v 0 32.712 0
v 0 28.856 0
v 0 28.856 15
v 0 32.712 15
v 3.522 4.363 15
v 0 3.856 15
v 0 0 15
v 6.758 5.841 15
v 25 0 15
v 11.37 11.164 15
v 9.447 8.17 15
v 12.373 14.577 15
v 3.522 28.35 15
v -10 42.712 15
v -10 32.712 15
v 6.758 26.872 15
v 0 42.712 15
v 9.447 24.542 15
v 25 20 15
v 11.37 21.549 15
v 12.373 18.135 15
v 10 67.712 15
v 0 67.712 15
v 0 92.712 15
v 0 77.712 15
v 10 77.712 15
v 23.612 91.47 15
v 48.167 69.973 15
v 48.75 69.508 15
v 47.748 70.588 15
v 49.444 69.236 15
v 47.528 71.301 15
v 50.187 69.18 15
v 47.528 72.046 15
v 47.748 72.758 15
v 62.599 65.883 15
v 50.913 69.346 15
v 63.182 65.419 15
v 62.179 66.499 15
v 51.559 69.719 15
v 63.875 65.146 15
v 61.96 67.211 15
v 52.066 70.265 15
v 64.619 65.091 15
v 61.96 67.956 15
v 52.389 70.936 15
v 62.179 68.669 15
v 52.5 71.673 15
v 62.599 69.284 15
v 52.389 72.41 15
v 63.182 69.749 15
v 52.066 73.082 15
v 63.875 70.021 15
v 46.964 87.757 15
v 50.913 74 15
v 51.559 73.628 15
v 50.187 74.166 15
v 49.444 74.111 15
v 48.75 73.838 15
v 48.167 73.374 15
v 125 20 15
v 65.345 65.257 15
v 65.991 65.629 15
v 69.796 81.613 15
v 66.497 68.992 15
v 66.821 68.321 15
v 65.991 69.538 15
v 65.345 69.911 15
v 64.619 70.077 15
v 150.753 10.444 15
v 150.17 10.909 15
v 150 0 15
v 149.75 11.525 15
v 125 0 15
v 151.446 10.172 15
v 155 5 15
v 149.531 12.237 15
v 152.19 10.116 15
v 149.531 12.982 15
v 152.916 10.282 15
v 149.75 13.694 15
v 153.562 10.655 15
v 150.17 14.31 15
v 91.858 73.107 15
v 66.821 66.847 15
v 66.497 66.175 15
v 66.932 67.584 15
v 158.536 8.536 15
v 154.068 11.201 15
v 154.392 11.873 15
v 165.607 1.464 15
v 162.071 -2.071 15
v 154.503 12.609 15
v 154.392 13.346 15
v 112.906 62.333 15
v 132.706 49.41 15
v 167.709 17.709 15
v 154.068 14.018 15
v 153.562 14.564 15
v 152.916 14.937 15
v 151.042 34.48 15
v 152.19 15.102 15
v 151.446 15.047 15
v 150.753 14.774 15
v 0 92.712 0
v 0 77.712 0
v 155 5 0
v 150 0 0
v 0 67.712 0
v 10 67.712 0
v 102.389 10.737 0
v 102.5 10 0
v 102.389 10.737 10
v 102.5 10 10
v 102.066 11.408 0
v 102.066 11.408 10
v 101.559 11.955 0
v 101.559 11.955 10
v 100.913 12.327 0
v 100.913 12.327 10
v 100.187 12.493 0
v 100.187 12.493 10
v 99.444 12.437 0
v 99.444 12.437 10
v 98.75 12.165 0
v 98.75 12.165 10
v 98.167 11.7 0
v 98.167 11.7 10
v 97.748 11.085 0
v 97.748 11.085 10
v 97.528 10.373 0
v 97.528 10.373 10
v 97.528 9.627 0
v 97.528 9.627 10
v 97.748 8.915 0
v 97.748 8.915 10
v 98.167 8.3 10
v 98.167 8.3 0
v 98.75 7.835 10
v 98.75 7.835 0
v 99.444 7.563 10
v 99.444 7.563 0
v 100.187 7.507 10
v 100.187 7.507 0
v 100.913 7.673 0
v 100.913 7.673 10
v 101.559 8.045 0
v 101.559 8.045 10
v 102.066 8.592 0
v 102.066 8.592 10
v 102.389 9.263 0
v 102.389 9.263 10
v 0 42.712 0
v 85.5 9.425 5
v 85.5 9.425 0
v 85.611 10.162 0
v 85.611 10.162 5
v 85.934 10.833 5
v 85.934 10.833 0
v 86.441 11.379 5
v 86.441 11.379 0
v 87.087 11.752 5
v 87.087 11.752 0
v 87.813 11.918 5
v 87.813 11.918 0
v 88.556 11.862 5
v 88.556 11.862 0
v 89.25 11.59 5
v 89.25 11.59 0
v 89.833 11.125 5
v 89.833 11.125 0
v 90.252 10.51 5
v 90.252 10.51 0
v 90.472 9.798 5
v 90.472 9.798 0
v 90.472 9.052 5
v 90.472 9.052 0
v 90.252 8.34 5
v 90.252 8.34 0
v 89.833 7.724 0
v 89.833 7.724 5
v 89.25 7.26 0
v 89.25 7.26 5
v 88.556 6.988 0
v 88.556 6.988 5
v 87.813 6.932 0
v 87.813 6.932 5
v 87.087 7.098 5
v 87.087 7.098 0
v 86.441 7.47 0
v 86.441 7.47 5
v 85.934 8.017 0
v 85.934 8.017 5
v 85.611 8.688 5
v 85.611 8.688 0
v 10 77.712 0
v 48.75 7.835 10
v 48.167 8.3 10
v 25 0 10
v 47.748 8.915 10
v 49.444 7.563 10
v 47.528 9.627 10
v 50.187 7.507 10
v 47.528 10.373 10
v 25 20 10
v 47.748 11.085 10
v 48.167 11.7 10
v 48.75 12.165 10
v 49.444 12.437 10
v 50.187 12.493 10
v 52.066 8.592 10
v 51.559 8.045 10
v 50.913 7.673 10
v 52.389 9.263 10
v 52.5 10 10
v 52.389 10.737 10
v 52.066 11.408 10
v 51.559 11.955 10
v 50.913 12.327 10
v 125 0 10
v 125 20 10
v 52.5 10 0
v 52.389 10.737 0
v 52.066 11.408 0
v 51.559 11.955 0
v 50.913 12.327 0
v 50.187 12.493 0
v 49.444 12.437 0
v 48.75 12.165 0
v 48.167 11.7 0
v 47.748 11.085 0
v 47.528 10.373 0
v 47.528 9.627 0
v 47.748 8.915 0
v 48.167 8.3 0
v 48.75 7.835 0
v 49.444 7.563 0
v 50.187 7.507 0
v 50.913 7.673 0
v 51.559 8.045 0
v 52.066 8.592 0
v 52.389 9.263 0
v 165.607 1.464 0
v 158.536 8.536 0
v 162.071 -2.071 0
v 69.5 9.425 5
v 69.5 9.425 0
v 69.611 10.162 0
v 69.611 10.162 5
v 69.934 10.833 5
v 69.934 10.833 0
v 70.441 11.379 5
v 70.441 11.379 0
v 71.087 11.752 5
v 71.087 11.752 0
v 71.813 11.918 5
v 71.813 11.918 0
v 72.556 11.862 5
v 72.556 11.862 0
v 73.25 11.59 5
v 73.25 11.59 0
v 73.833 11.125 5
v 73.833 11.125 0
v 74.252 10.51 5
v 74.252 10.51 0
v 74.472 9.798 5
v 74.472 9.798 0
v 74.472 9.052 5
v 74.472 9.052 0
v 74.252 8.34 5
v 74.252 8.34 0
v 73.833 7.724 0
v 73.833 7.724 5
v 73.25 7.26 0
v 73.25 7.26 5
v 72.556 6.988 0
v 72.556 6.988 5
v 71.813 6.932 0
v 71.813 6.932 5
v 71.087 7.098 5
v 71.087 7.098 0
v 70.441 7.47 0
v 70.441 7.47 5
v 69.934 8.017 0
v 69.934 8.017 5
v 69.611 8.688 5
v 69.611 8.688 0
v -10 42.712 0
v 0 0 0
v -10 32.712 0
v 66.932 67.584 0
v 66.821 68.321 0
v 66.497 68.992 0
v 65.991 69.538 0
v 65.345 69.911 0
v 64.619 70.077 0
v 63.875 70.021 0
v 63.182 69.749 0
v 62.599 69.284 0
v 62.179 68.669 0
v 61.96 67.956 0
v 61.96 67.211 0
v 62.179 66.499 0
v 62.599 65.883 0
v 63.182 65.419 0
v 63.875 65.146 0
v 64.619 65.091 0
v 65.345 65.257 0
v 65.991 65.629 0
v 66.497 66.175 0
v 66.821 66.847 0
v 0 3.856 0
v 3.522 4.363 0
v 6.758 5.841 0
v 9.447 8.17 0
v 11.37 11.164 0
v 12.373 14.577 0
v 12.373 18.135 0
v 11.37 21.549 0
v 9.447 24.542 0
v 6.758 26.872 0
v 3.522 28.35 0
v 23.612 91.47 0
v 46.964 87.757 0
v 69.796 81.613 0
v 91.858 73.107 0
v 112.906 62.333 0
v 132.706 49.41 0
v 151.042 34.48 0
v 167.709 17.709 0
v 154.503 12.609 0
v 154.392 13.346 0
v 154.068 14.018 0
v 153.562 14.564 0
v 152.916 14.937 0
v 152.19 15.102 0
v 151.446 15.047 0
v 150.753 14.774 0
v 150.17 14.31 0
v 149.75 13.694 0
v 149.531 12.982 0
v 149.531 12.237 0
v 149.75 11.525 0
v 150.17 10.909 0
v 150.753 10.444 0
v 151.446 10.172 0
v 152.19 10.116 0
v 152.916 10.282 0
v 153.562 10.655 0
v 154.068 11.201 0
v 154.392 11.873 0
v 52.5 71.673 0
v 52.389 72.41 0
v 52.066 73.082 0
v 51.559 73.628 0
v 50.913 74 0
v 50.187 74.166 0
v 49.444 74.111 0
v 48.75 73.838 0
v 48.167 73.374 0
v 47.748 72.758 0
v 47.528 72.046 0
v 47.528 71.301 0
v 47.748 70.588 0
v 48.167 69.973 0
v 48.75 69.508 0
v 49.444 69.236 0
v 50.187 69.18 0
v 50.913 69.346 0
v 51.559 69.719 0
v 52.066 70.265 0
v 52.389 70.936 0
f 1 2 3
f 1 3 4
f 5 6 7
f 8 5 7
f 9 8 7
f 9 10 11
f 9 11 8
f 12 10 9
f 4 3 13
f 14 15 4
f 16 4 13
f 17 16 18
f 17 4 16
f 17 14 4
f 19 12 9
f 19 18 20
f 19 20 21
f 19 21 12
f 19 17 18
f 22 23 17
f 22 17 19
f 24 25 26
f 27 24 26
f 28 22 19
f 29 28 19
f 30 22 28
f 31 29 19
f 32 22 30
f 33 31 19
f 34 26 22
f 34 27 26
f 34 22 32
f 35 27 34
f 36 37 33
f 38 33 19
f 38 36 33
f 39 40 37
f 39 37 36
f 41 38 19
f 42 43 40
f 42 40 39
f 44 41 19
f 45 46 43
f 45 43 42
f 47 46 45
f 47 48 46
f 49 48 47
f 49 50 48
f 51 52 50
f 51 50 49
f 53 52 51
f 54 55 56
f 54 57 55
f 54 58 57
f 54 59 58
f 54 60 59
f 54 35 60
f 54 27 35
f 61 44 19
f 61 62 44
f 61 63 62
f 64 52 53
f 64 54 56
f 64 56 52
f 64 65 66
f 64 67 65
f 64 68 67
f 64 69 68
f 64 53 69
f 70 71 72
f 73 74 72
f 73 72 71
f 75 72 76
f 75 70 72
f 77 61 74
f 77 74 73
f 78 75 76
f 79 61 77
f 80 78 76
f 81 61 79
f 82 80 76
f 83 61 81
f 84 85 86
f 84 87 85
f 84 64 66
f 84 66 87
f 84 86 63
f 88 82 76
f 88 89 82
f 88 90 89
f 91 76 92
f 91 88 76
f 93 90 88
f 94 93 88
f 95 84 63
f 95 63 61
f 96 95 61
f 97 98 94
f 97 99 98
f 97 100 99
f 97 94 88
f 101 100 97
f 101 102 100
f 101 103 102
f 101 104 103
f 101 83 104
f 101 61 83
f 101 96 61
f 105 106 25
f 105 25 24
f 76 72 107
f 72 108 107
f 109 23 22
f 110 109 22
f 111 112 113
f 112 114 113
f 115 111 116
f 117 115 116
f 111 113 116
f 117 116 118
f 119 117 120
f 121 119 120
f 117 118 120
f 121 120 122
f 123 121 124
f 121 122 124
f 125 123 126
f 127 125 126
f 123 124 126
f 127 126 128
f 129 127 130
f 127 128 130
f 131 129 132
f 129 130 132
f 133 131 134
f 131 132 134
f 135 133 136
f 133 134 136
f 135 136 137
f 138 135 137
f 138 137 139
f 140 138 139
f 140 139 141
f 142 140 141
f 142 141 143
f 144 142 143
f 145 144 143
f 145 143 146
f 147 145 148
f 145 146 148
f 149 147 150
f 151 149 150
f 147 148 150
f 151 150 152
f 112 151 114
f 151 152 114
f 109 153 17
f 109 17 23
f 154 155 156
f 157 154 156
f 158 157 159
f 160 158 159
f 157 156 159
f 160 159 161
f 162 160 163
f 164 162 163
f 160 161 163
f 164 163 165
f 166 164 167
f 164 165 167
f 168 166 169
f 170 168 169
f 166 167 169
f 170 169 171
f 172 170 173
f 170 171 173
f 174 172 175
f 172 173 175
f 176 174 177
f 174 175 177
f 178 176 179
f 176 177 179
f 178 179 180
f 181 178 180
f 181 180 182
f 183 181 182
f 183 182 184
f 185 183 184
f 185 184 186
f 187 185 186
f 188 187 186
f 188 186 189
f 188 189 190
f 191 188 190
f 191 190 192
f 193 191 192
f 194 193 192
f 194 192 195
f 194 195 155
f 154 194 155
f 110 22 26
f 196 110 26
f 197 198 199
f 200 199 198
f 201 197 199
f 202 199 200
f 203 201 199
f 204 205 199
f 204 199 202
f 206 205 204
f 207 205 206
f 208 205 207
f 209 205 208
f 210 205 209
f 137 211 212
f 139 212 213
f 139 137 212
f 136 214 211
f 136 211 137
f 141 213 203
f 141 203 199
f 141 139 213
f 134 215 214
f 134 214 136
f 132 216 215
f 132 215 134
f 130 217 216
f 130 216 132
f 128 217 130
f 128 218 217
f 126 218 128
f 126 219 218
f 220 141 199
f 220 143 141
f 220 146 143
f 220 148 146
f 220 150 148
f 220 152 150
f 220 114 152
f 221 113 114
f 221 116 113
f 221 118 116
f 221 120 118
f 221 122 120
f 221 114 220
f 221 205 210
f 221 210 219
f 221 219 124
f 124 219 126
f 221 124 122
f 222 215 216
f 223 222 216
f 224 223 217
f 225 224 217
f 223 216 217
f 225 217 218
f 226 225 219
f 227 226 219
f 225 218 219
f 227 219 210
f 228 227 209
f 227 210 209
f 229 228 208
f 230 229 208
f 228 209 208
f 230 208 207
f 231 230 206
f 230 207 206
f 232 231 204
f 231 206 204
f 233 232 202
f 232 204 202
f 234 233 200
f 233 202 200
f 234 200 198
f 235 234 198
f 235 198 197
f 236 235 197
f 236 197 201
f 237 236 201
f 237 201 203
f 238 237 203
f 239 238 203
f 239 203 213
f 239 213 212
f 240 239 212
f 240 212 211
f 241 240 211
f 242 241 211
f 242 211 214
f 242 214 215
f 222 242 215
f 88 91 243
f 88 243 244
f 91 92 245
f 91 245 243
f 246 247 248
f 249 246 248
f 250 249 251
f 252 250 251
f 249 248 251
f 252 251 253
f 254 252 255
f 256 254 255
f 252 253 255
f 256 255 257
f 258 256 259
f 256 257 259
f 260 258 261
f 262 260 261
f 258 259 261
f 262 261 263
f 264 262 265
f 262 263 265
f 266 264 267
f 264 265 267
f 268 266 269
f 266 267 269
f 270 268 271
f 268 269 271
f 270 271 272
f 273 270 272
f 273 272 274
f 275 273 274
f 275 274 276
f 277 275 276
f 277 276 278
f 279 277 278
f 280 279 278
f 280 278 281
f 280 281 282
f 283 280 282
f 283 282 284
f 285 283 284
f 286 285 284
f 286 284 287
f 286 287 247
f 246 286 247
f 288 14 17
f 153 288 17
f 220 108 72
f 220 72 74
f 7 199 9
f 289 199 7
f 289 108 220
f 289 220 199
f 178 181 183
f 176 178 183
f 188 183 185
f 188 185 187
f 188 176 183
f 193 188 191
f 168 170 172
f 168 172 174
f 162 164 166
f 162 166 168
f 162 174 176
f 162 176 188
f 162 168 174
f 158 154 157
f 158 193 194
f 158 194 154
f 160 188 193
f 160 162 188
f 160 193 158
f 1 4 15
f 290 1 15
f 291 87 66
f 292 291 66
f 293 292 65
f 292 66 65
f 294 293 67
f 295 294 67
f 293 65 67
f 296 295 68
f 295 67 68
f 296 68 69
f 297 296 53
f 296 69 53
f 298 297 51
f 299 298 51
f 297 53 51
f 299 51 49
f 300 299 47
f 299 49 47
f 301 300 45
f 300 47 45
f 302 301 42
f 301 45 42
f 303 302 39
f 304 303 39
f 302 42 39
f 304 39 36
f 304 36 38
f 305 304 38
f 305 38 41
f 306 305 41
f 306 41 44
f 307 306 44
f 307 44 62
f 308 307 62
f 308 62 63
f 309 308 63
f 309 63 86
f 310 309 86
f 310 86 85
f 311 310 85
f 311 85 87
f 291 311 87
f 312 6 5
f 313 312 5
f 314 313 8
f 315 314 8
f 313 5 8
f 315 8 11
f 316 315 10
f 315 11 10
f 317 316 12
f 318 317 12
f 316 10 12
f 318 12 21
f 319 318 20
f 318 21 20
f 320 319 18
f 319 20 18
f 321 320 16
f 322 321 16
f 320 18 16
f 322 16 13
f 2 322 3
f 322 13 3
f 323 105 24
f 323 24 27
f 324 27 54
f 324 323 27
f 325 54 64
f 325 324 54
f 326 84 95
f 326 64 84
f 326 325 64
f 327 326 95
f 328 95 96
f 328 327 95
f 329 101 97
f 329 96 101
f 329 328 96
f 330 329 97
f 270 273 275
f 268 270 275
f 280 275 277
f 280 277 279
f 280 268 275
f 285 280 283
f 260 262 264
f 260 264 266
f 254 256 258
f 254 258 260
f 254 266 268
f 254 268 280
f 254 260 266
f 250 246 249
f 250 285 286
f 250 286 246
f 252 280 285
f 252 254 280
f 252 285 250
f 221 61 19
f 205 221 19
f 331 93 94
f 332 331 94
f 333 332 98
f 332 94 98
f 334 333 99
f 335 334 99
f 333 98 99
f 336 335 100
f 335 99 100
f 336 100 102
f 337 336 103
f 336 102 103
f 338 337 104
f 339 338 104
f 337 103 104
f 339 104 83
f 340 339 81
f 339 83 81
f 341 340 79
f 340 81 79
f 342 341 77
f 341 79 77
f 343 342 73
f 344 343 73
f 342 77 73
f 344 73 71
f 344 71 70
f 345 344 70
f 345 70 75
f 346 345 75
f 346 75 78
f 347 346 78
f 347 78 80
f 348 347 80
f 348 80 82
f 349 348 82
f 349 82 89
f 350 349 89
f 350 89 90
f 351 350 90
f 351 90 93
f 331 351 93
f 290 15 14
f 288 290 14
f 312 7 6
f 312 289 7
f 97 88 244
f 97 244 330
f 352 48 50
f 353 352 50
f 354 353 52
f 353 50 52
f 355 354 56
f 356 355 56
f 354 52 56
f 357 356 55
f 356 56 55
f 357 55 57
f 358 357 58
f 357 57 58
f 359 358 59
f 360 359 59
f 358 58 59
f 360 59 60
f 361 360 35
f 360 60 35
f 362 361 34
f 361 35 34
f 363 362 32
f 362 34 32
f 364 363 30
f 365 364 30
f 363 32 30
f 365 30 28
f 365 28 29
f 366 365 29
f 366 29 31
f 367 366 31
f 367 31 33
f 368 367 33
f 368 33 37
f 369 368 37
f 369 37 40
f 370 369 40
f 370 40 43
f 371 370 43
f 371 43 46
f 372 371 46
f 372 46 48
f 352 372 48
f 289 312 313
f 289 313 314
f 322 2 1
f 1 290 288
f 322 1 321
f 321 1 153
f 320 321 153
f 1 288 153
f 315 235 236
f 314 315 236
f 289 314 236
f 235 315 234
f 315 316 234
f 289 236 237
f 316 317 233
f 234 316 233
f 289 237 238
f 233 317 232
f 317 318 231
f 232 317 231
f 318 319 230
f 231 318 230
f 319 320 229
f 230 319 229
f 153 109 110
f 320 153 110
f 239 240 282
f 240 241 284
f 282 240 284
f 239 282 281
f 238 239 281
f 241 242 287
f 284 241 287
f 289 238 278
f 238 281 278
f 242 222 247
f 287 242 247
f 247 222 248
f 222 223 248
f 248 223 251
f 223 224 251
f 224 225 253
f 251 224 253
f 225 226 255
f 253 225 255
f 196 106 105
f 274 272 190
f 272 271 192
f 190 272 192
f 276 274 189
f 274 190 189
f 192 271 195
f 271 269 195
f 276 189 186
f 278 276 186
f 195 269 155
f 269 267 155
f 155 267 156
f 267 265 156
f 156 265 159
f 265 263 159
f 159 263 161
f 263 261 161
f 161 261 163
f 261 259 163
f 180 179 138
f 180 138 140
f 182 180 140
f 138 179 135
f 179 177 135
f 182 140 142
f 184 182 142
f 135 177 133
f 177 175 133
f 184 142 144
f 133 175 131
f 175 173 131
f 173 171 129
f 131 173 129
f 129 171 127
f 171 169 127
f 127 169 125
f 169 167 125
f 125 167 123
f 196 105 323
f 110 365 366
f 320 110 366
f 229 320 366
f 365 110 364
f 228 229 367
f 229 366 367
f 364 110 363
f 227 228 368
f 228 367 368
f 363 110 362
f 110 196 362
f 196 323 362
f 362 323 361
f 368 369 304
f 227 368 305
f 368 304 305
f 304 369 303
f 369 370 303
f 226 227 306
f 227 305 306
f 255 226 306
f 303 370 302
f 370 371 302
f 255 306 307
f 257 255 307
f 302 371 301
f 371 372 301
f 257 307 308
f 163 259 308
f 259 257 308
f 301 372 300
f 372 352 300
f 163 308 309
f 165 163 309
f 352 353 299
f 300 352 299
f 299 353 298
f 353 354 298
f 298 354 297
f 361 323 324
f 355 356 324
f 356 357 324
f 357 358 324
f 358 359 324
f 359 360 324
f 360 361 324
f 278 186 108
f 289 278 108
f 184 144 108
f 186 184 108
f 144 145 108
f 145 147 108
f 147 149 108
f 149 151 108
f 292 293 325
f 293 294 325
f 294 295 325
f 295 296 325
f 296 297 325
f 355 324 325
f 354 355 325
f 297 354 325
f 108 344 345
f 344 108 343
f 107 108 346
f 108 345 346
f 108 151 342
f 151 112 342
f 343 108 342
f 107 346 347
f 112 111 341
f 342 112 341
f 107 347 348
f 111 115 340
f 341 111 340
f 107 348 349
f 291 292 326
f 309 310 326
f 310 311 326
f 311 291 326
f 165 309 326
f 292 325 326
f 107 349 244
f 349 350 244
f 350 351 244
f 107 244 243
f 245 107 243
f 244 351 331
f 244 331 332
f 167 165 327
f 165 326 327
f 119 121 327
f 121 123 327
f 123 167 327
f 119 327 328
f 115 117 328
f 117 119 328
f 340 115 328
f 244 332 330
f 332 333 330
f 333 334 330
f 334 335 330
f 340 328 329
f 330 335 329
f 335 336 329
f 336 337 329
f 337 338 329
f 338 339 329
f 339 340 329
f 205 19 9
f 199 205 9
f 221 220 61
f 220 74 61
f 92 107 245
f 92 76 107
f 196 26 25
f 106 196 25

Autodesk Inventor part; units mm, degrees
ref_plane "YZ Plane" through (0, 0, 0) normal (1, 0, 0) x (0, 1, 0)
ref_plane "XZ Plane" through (0, 0, 0) normal (0, 1, 0) x (-1, 0, 0)
ref_plane "XY Plane" through (0, 0, 0) normal (0, 0, 1) x (1, 0, 0)
sketch "Sketch1" plane through (0, 0, 0) normal (0, 0, 1) x (1, 0, 0)
  circle A0 centre (0, -132.2876) radius 225 construction
  circle A1 centre (0, -132.2876) radius 200 construction
  line L0 (-225, -132.2876) -> (225, -132.2876) construction
  line L1 (150, -132.2876) -> (150, 35.4175) construction
  line L2 (175, -132.2876) -> (175, 9.1338) construction
  line L3 (0, 92.7124) -> (0, -357.2876) construction
  line L4 (150, 0) -> (0, 0)
  line L5 (0, 0) -> (0, 92.7124)
  line L6 (150, 0) -> (167.7086, 17.7086)
  line L7 (150, 0) -> (175.0437, 0) construction
  arc A2 (167.7086, 17.7086) -> (0, 92.7124) centre (0, -132.2876) ccw
  dimension "d0" = 450
  dimension "d1" = 25
  dimension "d2" = 75
  dimension "d3" = 25
  dimension "d4" = 45
extrude "Extrusion1" add sketch "Sketch1" along normal blind 15
sketch "Sketch2" plane through (0, 0, 15) normal (0, 0, 1) x (1, 0, 0)
  line L0 (10, 77.7124) -> (0, 77.7124)
  line L1 (0, 77.7124) -> (0, 67.7124)
  line L2 (0, 67.7124) -> (10, 67.7124)
  line L3 (10, 67.7124) -> (10, 77.7124)
  line L4 (0, 92.7124) -> (0, 0) projected
  line L5 (0, 0) -> (150, 0) projected
  line L6 (150, 0) -> (167.7086, 17.7086) projected
  arc A0 (167.7086, 17.7086) -> (0, 92.7124) centre (0, -132.2876) ccw projected
  line L7 (0, 92.7124) -> (0, 0) projected
  dimension "d7" = 10
  dimension "d8" = 10
  dimension "d21" = 15
extrude "Extrusion2" cut sketch "Sketch2" against normal blind 15 contours L3 L2 L1 L0
sketch "Sketch3" plane through (0, 0, 15) normal (0, 0, 1) x (1, 0, 0)
  line L0 (-10, 42.7124) -> (0, 42.7124)
  line L1 (0, 42.7124) -> (0, 32.7124)
  line L2 (0, 32.7124) -> (-10, 32.7124)
  line L3 (-10, 32.7124) -> (-10, 42.7124)
  line L4 (0, 0) -> (150, 0) projected
  line L5 (150, 0) -> (167.7086, 17.7086) projected
  arc A0 (167.7086, 17.7086) -> (0, 92.7124) centre (0, -132.2876) ccw projected
  line L6 (0, 67.7124) -> (0, 0) projected
  line L7 (0, 67.7124) -> (0, 0) projected
  line L8 (10, 67.7124) -> (0, 67.7124) projected
  line L9 (0, 92.7124) -> (0, 77.7124) projected
  line L10 (0, 77.7124) -> (10, 77.7124) projected
  line L11 (10, 77.7124) -> (10, 67.7124) projected
  dimension "d15" = 10
  dimension "d16" = 10
  dimension "d20" = 25
extrude "Extrusion3" add sketch "Sketch3" against normal blind 15 contours L0 L1 L2 L3
sketch "Sketch4" plane through (0, 0, 15) normal (0, 0, 1) x (1, 0, 0)
  line L0 (155, 5) -> (162.0711, -2.0711)
  line L1 (162.0711, -2.0711) -> (165.6066, 1.4645)
  line L2 (165.6066, 1.4645) -> (158.5355, 8.5355)
  line L3 (158.5355, 8.5355) -> (155, 5)
  line L4 (10, 67.7124) -> (0, 67.7124) projected
  line L5 (0, 67.7124) -> (0, 42.7124) projected
  line L6 (-10, 42.7124) -> (0, 42.7124) projected
  line L7 (-10, 32.7124) -> (-10, 42.7124) projected
  line L8 (0, 32.7124) -> (-10, 32.7124) projected
  line L9 (0, 32.7124) -> (0, 0) projected
  line L10 (0, 0) -> (150, 0) projected
  line L11 (150, 0) -> (167.7086, 17.7086) projected
  arc A0 (167.7086, 17.7086) -> (0, 92.7124) centre (0, -132.2876) ccw projected
  line L12 (0, 92.7124) -> (0, 77.7124) projected
  line L13 (0, 77.7124) -> (10, 77.7124) projected
  line L14 (10, 77.7124) -> (10, 67.7124) projected
  line L15 (150, 0) -> (167.7086, 17.7086) projected
  dimension "d22" = 10
  dimension "d23" = 5
  dimension "d24" = 5
extrude "Extrusion4" add sketch "Sketch4" against normal blind 15 contours L3 L2 L1 L0
sketch "Sketch5" plane through (0, 0, 15) normal (0, 0, 1) x (1, 0, 0)
  line L0 (10, 67.7124) -> (0, 67.7124) construction
  line L1 (0, 67.7124) -> (0, 42.7124) construction
  line L2 (-10, 42.7124) -> (0, 42.7124) construction
  line L3 (-10, 32.7124) -> (-10, 42.7124) construction
  line L4 (0, 32.7124) -> (-10, 32.7124) construction
  line L5 (0, 32.7124) -> (0, 0) construction
  line L6 (0, 0) -> (150, 0) construction
  line L7 (150, 0) -> (155, 5) construction
  line L8 (155, 5) -> (162.0711, -2.0711) construction
  line L9 (162.0711, -2.0711) -> (165.6066, 1.4645) construction
  line L10 (165.6066, 1.4645) -> (158.5355, 8.5355) construction
  line L11 (158.5355, 8.5355) -> (167.7086, 17.7086) construction
  arc A0 (167.7086, 17.7086) -> (0, 92.7124) centre (0, -132.2876) ccw construction
  line L12 (0, 92.7124) -> (0, 77.7124) construction
  line L13 (0, 77.7124) -> (10, 77.7124) construction
  line L14 (10, 77.7124) -> (10, 67.7124) construction
  circle A1 centre (0, -132.2876) radius 225 construction
  arc A2 (167.7086, 17.7086) -> (0, 92.7124) centre (0, -132.2876) ccw construction
  circle A3 centre (0, -132.2876) radius 210 construction
  circle A4 centre (50, 71.6732) radius 2.5
  circle A5 centre (64.4318, 67.5838) radius 2.5
  circle A6 centre (152.0028, 12.6094) radius 2.5
  dimension "d27" = 450
  dimension "d28" = 15
  dimension "d31" = 5
  dimension "d32" = 5
  dimension "d33" = 15
  dimension "d34" = 50
  dimension "d46" = 5
  dimension "d49" = 7.5
extrude "Extrusion5" cut sketch "Sketch5" against normal through all
thread "Thread1" size "M5x0.8" class "6H" standard "ANSI Metric M Profile" full length
thread "Thread2" size "M5x0.8" class "6H" standard "ANSI Metric M Profile" full length
thread "Thread4" size "M5x0.8" class "6H" standard "ANSI Metric M Profile" full length
sketch "Sketch7" plane through (0, 0, 15) normal (0, 0, 1) x (1, 0, 0)
  line L0 (0, 0) -> (150, 0) construction
  line L1 (25, 0) -> (125, 0) construction
  line L2 (125, 0) -> (125, 20) construction
  line L3 (125, 20) -> (25, 20) construction
  line L4 (25, 20) -> (25, 0) construction
  circle A0 centre (50, 10) radius 2.5
  circle A1 centre (100, 10) radius 2.5
  dimension "d52" = 100
  dimension "d53" = 20
  dimension "d54" = 25
  dimension "d55" = 5
  dimension "d56" = 5
  dimension "d57" = 25
  dimension "d58" = 25
extrude "Extrusion6" cut sketch "Sketch7" against normal through all
thread "Thread5" size "M5x0.8" class "6H" standard "ANSI Metric M Profile" full length
thread "Thread6" size "M5x0.8" class "6H" standard "ANSI Metric M Profile" full length
sketch "Sketch8" plane through (0, 0, 15) normal (0, 0, 1) x (1, 0, 0)
  line L0 (0, 0) -> (150, 0) projected
  line L1 (25, 0) -> (125, 0)
  line L2 (125, 0) -> (125, 20)
  line L3 (125, 20) -> (25, 20)
  line L4 (25, 20) -> (25, 0)
  line L5 (0, 32.7124) -> (0, 0) projected
  dimension "d67" = 100
  dimension "d68" = 20
  dimension "d69" = 25
extrude "Extrusion7" cut sketch "Sketch8" against normal blind 5
sketch "Sketch9" plane through (0, 0, 15) normal (0, 0, 1) x (1, 0, 0)
  line L0 (0, 32.7124) -> (0, 0) projected
  circle A0 centre (0, 16.3562) radius 12.5
  dimension "d72" = 25
extrude "Extrusion8" cut sketch "Sketch9" against normal through all
sketch "Sketch10" plane through (0, 0, 0) normal (0, 0, -1) x (-1, 0, 0)
  circle A0 centre (-72, 9.4249) radius 2.5
  circle A1 centre (-88, 9.4249) radius 2.5
  point P0 (0, 0)
  dimension "d75" = 5
  dimension "d76" = 5
  dimension "d77" = 16
  dimension "d79" = 88
  dimension "d80" = 9.4249
extrude "Extrusion9" cut sketch "Sketch10" against normal blind 5
thread "Thread8" size "M5x0.8" class "6H" standard "ANSI Metric M Profile" full length
thread "Thread9" size "M5x0.8" class "6H" standard "ANSI Metric M Profile" full length
equation "\"d35\" = d46"
properties part number "CP006" material "ABS Plastic"
